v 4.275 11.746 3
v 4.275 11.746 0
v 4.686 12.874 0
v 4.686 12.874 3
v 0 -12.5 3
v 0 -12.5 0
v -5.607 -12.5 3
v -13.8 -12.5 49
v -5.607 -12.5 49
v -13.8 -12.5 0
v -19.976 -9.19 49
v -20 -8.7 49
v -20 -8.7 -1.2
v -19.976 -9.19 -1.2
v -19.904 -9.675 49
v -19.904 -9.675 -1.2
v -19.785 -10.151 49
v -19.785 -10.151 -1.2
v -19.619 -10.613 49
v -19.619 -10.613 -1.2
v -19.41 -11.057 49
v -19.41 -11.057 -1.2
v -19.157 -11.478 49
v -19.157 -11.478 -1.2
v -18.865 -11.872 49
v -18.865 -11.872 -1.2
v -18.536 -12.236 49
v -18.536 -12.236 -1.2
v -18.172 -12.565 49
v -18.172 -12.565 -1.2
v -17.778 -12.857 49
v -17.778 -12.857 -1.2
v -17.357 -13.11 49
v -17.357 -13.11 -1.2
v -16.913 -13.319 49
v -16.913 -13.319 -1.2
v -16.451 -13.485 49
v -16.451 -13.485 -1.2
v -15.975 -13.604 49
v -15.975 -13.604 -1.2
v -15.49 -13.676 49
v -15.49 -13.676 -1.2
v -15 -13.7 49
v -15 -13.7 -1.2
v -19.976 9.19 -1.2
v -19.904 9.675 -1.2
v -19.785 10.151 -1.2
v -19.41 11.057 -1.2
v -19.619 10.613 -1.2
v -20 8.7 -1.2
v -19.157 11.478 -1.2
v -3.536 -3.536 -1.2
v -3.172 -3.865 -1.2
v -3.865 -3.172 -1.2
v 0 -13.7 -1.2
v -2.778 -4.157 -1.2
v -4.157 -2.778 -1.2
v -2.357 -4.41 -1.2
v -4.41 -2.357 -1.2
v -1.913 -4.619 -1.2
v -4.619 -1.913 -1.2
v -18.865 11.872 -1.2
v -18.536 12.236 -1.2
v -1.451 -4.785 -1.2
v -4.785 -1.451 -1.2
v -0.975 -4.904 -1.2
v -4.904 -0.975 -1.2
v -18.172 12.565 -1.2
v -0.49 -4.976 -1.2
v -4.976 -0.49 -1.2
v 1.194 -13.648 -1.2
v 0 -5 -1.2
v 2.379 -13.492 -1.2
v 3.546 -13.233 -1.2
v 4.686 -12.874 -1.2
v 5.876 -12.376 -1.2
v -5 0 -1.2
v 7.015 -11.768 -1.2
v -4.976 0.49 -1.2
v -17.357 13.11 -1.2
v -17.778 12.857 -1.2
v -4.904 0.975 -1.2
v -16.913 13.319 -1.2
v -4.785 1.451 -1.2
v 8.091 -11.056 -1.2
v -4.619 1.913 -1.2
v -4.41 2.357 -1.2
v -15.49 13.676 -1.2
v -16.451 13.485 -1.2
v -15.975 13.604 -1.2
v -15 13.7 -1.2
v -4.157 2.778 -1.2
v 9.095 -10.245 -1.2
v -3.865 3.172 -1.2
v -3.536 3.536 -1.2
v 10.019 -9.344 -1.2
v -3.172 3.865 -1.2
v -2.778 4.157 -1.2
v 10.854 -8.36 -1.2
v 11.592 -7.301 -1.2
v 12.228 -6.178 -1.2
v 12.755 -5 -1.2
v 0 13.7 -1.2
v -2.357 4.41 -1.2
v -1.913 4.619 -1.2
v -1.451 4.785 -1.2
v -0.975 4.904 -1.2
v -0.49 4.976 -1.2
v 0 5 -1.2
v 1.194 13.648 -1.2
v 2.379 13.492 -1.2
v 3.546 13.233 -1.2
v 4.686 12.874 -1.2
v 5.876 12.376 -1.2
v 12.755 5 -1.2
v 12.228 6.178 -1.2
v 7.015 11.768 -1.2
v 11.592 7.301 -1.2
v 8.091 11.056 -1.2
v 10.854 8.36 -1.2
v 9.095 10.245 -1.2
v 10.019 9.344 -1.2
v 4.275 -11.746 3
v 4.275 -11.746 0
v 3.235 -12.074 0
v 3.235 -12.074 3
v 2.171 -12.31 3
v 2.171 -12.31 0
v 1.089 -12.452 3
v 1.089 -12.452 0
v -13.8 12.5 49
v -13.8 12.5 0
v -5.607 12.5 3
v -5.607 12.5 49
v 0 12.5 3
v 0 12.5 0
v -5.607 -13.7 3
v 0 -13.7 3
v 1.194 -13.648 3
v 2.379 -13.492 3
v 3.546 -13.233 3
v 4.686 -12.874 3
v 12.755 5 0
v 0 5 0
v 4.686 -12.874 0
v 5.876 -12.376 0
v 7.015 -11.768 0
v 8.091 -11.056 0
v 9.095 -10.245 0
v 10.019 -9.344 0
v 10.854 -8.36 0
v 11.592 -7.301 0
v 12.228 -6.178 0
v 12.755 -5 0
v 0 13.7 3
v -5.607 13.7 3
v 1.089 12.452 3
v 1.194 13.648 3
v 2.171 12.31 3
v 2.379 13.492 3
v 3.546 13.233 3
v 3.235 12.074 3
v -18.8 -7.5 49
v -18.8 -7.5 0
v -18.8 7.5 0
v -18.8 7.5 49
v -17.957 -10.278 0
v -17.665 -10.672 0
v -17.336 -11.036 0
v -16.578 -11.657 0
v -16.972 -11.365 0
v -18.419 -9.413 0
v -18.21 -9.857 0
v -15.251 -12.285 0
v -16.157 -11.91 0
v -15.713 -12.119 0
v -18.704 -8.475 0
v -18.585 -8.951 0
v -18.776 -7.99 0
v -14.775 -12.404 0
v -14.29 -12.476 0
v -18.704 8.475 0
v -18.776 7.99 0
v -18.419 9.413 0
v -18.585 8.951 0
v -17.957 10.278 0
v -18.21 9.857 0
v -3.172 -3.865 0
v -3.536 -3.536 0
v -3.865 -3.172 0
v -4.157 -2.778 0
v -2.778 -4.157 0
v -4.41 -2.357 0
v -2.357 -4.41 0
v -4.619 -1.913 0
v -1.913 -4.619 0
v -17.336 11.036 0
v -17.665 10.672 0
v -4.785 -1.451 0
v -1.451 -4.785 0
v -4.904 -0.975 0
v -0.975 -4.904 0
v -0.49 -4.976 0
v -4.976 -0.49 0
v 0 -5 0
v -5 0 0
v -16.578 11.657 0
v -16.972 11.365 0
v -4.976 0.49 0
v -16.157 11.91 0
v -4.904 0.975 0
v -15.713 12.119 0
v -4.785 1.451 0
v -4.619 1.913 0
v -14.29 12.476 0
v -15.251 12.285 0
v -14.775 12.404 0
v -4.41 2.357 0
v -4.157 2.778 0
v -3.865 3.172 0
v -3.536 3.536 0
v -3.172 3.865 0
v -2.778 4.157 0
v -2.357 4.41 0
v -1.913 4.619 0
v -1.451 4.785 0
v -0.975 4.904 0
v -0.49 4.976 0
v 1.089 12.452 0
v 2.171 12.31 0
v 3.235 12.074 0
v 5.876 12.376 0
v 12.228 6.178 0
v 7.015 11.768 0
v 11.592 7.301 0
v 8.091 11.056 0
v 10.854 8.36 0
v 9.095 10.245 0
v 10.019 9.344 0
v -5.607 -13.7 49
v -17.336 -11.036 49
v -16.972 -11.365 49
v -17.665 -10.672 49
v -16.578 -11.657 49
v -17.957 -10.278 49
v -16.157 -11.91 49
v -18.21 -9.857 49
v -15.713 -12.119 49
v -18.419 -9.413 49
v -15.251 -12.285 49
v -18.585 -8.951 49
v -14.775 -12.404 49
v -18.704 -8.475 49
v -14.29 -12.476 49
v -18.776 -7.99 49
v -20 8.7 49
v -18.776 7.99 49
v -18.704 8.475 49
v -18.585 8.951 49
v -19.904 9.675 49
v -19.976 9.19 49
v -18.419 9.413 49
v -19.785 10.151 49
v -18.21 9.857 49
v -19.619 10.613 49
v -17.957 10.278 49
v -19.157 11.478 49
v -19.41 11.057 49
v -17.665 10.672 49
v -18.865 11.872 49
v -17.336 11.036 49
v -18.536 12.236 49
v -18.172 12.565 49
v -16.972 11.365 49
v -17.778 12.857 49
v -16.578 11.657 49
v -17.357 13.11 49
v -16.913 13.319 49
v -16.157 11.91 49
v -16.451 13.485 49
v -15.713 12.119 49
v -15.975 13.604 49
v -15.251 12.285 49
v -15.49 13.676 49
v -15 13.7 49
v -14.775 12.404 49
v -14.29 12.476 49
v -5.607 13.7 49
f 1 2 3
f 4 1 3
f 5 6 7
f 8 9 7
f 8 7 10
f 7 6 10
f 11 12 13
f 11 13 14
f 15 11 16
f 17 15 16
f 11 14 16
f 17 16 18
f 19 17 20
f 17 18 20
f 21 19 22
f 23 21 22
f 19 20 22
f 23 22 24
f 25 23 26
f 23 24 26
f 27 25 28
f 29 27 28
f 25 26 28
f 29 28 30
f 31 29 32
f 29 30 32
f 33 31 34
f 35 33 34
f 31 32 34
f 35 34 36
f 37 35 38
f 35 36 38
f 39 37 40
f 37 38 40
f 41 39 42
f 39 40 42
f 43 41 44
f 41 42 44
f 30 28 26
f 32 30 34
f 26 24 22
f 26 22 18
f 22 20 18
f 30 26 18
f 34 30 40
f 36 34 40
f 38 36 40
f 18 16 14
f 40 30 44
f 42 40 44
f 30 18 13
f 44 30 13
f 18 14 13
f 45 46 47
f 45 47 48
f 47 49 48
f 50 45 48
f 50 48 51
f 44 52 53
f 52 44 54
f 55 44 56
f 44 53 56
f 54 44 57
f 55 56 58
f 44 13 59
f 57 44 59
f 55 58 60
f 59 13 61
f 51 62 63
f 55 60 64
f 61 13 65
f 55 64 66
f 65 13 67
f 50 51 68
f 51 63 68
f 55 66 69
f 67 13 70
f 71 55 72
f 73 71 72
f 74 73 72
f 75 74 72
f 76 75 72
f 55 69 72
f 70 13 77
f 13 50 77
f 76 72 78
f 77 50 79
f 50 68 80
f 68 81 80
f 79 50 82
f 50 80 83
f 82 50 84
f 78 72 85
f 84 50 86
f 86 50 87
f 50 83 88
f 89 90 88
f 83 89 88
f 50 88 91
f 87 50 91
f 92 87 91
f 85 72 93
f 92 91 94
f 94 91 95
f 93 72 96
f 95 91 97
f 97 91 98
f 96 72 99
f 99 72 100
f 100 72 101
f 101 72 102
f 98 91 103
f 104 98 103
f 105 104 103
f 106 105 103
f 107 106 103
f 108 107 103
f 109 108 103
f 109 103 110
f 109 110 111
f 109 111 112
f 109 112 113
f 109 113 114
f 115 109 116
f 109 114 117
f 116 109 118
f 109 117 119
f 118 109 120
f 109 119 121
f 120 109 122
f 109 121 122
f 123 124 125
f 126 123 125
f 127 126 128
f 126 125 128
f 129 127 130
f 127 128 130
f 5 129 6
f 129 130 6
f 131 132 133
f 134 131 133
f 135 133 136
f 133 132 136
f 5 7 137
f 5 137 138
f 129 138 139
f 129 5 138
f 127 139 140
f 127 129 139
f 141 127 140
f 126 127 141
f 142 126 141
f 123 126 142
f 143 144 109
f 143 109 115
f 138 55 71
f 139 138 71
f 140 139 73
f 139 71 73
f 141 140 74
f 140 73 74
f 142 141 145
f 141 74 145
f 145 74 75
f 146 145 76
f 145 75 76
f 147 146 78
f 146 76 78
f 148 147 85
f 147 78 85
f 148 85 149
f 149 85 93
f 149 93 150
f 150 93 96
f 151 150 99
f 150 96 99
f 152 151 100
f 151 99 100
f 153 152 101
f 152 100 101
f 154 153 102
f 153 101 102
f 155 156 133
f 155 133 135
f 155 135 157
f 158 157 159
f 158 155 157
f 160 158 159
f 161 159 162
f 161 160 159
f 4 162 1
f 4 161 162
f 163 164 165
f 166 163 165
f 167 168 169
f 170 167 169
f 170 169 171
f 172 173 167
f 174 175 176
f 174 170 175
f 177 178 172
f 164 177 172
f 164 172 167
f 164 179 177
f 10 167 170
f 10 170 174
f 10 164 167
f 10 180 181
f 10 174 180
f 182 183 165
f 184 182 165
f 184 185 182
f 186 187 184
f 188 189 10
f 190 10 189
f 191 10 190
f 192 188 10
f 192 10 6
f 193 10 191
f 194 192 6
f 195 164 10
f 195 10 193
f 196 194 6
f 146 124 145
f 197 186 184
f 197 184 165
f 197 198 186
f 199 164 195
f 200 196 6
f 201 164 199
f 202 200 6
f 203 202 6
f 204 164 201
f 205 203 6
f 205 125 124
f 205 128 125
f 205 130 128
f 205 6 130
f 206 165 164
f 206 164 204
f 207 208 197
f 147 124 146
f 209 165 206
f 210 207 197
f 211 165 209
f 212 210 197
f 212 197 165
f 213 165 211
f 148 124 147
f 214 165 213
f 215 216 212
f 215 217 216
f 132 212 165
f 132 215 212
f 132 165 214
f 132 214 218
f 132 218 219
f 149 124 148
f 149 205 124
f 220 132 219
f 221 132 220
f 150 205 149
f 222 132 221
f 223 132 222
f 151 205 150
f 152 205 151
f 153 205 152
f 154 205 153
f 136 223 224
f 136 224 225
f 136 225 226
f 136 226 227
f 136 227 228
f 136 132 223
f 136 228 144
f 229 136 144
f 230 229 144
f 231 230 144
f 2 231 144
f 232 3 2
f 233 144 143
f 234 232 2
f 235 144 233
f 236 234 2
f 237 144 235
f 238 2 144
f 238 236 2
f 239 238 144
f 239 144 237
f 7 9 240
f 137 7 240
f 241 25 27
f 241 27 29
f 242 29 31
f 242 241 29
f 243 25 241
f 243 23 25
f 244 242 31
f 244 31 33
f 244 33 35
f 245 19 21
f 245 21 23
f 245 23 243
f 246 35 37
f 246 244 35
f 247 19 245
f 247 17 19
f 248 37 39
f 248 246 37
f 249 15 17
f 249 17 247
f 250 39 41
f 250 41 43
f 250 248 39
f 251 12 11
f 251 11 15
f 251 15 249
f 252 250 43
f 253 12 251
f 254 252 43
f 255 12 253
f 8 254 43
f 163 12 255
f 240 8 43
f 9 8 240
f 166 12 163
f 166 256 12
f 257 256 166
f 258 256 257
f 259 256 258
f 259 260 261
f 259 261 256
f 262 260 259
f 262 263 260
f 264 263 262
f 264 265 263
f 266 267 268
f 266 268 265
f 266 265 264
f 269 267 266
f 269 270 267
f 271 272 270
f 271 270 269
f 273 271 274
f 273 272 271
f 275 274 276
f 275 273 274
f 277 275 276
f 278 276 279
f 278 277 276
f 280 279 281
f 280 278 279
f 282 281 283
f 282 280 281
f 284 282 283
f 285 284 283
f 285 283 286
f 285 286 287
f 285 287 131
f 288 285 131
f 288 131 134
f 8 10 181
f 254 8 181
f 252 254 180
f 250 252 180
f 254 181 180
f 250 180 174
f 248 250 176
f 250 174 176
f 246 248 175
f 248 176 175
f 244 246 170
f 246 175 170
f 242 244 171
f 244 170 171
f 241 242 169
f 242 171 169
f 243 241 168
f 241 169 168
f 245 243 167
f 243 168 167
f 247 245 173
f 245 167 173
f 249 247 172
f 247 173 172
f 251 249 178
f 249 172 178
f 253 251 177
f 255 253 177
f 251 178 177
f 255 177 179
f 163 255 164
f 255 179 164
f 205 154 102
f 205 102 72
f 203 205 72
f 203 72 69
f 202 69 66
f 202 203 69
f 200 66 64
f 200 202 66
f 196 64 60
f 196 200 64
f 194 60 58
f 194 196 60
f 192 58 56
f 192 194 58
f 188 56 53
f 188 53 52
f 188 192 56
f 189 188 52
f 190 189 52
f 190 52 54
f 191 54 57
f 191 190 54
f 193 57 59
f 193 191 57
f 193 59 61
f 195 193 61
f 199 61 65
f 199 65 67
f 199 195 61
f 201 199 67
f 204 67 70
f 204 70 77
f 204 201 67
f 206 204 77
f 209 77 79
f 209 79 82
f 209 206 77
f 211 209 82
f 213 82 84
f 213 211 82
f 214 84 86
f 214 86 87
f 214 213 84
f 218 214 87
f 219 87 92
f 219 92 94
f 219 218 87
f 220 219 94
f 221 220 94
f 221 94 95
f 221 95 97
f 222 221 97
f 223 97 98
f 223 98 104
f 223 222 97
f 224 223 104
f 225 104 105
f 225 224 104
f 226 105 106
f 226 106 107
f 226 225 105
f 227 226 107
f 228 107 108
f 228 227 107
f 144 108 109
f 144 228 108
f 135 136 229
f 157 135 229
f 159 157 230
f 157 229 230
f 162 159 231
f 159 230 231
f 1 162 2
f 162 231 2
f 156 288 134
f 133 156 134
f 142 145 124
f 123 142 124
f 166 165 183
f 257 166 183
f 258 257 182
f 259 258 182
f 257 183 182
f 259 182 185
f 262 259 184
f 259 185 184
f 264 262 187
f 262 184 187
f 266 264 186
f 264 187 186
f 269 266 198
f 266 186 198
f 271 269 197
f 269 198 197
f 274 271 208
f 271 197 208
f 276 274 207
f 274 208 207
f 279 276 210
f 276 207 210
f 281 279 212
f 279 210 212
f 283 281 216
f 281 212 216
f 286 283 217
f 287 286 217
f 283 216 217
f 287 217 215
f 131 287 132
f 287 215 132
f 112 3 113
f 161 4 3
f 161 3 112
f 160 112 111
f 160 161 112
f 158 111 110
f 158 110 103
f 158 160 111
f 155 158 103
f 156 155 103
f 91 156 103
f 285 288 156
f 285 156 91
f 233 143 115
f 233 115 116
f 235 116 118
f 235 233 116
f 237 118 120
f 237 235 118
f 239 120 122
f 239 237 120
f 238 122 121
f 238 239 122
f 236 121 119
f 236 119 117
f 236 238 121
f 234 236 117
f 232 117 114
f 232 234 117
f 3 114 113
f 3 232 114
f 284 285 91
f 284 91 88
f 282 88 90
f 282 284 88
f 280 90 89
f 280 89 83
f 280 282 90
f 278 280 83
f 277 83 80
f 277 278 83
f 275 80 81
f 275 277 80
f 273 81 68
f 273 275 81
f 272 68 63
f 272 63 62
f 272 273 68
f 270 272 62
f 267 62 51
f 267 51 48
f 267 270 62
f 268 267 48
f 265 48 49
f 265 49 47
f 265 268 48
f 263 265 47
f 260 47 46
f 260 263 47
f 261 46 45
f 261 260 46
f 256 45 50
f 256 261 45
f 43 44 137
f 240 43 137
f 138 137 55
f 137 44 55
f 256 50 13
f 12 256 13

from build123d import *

# Parameters (mm, degrees)
F1_DEPTH = 1.2
F2_DEPTH = 49
F4_DEPTH = 46


# Not quite as in the source:
# - a feature names something its author has since deleted; it is built from what else it names


with BuildPart() as f1:
    # F0 (on Top) → F1 (new body)
    with BuildSketch(Plane.XY):
        with BuildLine():
            Line((-15, -13.7), (0, -13.7))
            ThreePointArc((0, -13.7), (2.378980034, -13.4918662163), (4.6856759636, -12.8737889048))
            Line((4.6856759636, -12.8737889048), (4.2752517916, -11.7461577598))
            ThreePointArc((4.2752517916, -11.7461577598), (2.1706022208, -12.3100969127), (0, -12.5))
            Line((0, -12.5), (-13.8, -12.5))
            ThreePointArc((-13.8, -12.5), (-17.3355339059, -11.0355339059), (-18.8, -7.5))
            Line((-18.8, -7.5), (-18.8, 7.5))
            ThreePointArc((-18.8, 7.5), (-17.3355339059, 11.0355339059), (-13.8, 12.5))
            Line((-13.8, 12.5), (0, 12.5))
            ThreePointArc((0, 12.5), (2.1706022208, 12.3100969127), (4.2752517916, 11.7461577598))
            Line((4.2752517916, 11.7461577598), (4.6856759636, 12.8737889048))
            ThreePointArc((4.6856759636, 12.8737889048), (2.378980034, 13.4918662163), (0, 13.7))
            Line((0, 13.7), (-15, 13.7))
            ThreePointArc((-15, 13.7), (-18.5355339059, 12.2355339059), (-20, 8.7))
            Line((-20, 8.7), (-20, -8.7))
            ThreePointArc((-20, -8.7), (-18.5355339059, -12.2355339059), (-15, -13.7))
        make_face()
        with BuildLine():
            Line((4.2752517916, -11.7461577598), (4.6856759636, -12.8737889048))
            ThreePointArc((4.6856759636, -12.8737889048), (9.5678327692, -9.8054360485), (12.75499902, -5))
            Line((12.75499902, -5), (11.4564392374, -5))
            ThreePointArc((11.4564392374, -5), (8.5585738758, -9.1104782099), (4.2752517916, -11.7461577598))
        make_face()
        with BuildLine():
            ThreePointArc((0, -12.5), (2.1706022208, -12.3100969127), (4.2752517916, -11.7461577598))
            ThreePointArc((4.2752517916, -11.7461577598), (8.5585738758, -9.1104782099), (11.4564392374, -5))
            Line((11.4564392374, -5), (0, -5))
            ThreePointArc((0, -5), (-5, 0), (0, 5))
            Line((0, 5), (11.4564392374, 5))
            ThreePointArc((11.4564392374, 5), (8.5585738758, 9.1104782099), (4.2752517916, 11.7461577598))
            ThreePointArc((4.2752517916, 11.7461577598), (2.1706022208, 12.3100969127), (0, 12.5))
            Line((0, 12.5), (-13.8, 12.5))
            ThreePointArc((-13.8, 12.5), (-17.3355339059, 11.0355339059), (-18.8, 7.5))
            Line((-18.8, 7.5), (-18.8, -7.5))
            ThreePointArc((-18.8, -7.5), (-17.3355339059, -11.0355339059), (-13.8, -12.5))
            Line((-13.8, -12.5), (0, -12.5))
        make_face()
        with BuildLine():
            ThreePointArc((4.2752517916, 11.7461577598), (8.5585738758, 9.1104782099), (11.4564392374, 5))
            Line((11.4564392374, 5), (12.75499902, 5))
            ThreePointArc((12.75499902, 5), (9.5678327692, 9.8054360485), (4.6856759636, 12.8737889048))
            Line((4.6856759636, 12.8737889048), (4.2752517916, 11.7461577598))
        make_face()
    extrude(amount=-F1_DEPTH)

    # F0 (on Top) → F2 (join)
    with BuildSketch(Plane.XY):
        with BuildLine():
            Line((-15, -13.7), (0, -13.7))
            ThreePointArc((0, -13.7), (2.378980034, -13.4918662163), (4.6856759636, -12.8737889048))
            Line((4.6856759636, -12.8737889048), (4.2752517916, -11.7461577598))
            ThreePointArc((4.2752517916, -11.7461577598), (2.1706022208, -12.3100969127), (0, -12.5))
            Line((0, -12.5), (-13.8, -12.5))
            ThreePointArc((-13.8, -12.5), (-17.3355339059, -11.0355339059), (-18.8, -7.5))
            Line((-18.8, -7.5), (-18.8, 7.5))
            ThreePointArc((-18.8, 7.5), (-17.3355339059, 11.0355339059), (-13.8, 12.5))
            Line((-13.8, 12.5), (0, 12.5))
            ThreePointArc((0, 12.5), (2.1706022208, 12.3100969127), (4.2752517916, 11.7461577598))
            Line((4.2752517916, 11.7461577598), (4.6856759636, 12.8737889048))
            ThreePointArc((4.6856759636, 12.8737889048), (2.378980034, 13.4918662163), (0, 13.7))
            Line((0, 13.7), (-15, 13.7))
            ThreePointArc((-15, 13.7), (-18.5355339059, 12.2355339059), (-20, 8.7))
            Line((-20, 8.7), (-20, -8.7))
            ThreePointArc((-20, -8.7), (-18.5355339059, -12.2355339059), (-15, -13.7))
        make_face()
    extrude(amount=F2_DEPTH)

    # F3 (on face) → F4 (cut)
    with BuildSketch(Plane.XY.offset(49)):
        with BuildLine():
            ThreePointArc((-5.6071383076, 12.5), (-2.8670542374, 13.3966413701), (0, 13.7))
            Line((0, 13.7), (-5.6071383076, 13.7))
            Line((-5.6071383076, 13.7), (-5.6071383076, 12.5))
        make_face()
        with BuildLine():
            Line((4.2752517916, 11.7461577598), (4.6856759636, 12.8737889048))
            ThreePointArc((4.6856759636, 12.8737889048), (2.378980034, 13.4918662163), (0, 13.7))
            ThreePointArc((0, 13.7), (-2.8670542374, 13.3966413701), (-5.6071383076, 12.5))
            Line((-5.6071383076, 12.5), (0, 12.5))
            ThreePointArc((0, 12.5), (2.1706022208, 12.3100969127), (4.2752517916, 11.7461577598))
        make_face()
        with BuildLine():
            ThreePointArc((0, -13.7), (2.378980034, -13.4918662163), (4.6856759636, -12.8737889048))
            Line((4.6856759636, -12.8737889048), (4.2752517916, -11.7461577598))
            ThreePointArc((4.2752517916, -11.7461577598), (2.1706022208, -12.3100969127), (0, -12.5))
            Line((0, -12.5), (-5.6071383076, -12.5))
            ThreePointArc((-5.6071383076, -12.5), (-2.8670542374, -13.3966413701), (0, -13.7))
        make_face()
        with BuildLine():
            Line((-5.6071383076, -13.7), (0, -13.7))
            ThreePointArc((0, -13.7), (-2.8670542374, -13.3966413701), (-5.6071383076, -12.5))
            Line((-5.6071383076, -12.5), (-5.6071383076, -13.7))
        make_face()
    extrude(amount=-F4_DEPTH, mode=Mode.SUBTRACT)


solid = f1.part
